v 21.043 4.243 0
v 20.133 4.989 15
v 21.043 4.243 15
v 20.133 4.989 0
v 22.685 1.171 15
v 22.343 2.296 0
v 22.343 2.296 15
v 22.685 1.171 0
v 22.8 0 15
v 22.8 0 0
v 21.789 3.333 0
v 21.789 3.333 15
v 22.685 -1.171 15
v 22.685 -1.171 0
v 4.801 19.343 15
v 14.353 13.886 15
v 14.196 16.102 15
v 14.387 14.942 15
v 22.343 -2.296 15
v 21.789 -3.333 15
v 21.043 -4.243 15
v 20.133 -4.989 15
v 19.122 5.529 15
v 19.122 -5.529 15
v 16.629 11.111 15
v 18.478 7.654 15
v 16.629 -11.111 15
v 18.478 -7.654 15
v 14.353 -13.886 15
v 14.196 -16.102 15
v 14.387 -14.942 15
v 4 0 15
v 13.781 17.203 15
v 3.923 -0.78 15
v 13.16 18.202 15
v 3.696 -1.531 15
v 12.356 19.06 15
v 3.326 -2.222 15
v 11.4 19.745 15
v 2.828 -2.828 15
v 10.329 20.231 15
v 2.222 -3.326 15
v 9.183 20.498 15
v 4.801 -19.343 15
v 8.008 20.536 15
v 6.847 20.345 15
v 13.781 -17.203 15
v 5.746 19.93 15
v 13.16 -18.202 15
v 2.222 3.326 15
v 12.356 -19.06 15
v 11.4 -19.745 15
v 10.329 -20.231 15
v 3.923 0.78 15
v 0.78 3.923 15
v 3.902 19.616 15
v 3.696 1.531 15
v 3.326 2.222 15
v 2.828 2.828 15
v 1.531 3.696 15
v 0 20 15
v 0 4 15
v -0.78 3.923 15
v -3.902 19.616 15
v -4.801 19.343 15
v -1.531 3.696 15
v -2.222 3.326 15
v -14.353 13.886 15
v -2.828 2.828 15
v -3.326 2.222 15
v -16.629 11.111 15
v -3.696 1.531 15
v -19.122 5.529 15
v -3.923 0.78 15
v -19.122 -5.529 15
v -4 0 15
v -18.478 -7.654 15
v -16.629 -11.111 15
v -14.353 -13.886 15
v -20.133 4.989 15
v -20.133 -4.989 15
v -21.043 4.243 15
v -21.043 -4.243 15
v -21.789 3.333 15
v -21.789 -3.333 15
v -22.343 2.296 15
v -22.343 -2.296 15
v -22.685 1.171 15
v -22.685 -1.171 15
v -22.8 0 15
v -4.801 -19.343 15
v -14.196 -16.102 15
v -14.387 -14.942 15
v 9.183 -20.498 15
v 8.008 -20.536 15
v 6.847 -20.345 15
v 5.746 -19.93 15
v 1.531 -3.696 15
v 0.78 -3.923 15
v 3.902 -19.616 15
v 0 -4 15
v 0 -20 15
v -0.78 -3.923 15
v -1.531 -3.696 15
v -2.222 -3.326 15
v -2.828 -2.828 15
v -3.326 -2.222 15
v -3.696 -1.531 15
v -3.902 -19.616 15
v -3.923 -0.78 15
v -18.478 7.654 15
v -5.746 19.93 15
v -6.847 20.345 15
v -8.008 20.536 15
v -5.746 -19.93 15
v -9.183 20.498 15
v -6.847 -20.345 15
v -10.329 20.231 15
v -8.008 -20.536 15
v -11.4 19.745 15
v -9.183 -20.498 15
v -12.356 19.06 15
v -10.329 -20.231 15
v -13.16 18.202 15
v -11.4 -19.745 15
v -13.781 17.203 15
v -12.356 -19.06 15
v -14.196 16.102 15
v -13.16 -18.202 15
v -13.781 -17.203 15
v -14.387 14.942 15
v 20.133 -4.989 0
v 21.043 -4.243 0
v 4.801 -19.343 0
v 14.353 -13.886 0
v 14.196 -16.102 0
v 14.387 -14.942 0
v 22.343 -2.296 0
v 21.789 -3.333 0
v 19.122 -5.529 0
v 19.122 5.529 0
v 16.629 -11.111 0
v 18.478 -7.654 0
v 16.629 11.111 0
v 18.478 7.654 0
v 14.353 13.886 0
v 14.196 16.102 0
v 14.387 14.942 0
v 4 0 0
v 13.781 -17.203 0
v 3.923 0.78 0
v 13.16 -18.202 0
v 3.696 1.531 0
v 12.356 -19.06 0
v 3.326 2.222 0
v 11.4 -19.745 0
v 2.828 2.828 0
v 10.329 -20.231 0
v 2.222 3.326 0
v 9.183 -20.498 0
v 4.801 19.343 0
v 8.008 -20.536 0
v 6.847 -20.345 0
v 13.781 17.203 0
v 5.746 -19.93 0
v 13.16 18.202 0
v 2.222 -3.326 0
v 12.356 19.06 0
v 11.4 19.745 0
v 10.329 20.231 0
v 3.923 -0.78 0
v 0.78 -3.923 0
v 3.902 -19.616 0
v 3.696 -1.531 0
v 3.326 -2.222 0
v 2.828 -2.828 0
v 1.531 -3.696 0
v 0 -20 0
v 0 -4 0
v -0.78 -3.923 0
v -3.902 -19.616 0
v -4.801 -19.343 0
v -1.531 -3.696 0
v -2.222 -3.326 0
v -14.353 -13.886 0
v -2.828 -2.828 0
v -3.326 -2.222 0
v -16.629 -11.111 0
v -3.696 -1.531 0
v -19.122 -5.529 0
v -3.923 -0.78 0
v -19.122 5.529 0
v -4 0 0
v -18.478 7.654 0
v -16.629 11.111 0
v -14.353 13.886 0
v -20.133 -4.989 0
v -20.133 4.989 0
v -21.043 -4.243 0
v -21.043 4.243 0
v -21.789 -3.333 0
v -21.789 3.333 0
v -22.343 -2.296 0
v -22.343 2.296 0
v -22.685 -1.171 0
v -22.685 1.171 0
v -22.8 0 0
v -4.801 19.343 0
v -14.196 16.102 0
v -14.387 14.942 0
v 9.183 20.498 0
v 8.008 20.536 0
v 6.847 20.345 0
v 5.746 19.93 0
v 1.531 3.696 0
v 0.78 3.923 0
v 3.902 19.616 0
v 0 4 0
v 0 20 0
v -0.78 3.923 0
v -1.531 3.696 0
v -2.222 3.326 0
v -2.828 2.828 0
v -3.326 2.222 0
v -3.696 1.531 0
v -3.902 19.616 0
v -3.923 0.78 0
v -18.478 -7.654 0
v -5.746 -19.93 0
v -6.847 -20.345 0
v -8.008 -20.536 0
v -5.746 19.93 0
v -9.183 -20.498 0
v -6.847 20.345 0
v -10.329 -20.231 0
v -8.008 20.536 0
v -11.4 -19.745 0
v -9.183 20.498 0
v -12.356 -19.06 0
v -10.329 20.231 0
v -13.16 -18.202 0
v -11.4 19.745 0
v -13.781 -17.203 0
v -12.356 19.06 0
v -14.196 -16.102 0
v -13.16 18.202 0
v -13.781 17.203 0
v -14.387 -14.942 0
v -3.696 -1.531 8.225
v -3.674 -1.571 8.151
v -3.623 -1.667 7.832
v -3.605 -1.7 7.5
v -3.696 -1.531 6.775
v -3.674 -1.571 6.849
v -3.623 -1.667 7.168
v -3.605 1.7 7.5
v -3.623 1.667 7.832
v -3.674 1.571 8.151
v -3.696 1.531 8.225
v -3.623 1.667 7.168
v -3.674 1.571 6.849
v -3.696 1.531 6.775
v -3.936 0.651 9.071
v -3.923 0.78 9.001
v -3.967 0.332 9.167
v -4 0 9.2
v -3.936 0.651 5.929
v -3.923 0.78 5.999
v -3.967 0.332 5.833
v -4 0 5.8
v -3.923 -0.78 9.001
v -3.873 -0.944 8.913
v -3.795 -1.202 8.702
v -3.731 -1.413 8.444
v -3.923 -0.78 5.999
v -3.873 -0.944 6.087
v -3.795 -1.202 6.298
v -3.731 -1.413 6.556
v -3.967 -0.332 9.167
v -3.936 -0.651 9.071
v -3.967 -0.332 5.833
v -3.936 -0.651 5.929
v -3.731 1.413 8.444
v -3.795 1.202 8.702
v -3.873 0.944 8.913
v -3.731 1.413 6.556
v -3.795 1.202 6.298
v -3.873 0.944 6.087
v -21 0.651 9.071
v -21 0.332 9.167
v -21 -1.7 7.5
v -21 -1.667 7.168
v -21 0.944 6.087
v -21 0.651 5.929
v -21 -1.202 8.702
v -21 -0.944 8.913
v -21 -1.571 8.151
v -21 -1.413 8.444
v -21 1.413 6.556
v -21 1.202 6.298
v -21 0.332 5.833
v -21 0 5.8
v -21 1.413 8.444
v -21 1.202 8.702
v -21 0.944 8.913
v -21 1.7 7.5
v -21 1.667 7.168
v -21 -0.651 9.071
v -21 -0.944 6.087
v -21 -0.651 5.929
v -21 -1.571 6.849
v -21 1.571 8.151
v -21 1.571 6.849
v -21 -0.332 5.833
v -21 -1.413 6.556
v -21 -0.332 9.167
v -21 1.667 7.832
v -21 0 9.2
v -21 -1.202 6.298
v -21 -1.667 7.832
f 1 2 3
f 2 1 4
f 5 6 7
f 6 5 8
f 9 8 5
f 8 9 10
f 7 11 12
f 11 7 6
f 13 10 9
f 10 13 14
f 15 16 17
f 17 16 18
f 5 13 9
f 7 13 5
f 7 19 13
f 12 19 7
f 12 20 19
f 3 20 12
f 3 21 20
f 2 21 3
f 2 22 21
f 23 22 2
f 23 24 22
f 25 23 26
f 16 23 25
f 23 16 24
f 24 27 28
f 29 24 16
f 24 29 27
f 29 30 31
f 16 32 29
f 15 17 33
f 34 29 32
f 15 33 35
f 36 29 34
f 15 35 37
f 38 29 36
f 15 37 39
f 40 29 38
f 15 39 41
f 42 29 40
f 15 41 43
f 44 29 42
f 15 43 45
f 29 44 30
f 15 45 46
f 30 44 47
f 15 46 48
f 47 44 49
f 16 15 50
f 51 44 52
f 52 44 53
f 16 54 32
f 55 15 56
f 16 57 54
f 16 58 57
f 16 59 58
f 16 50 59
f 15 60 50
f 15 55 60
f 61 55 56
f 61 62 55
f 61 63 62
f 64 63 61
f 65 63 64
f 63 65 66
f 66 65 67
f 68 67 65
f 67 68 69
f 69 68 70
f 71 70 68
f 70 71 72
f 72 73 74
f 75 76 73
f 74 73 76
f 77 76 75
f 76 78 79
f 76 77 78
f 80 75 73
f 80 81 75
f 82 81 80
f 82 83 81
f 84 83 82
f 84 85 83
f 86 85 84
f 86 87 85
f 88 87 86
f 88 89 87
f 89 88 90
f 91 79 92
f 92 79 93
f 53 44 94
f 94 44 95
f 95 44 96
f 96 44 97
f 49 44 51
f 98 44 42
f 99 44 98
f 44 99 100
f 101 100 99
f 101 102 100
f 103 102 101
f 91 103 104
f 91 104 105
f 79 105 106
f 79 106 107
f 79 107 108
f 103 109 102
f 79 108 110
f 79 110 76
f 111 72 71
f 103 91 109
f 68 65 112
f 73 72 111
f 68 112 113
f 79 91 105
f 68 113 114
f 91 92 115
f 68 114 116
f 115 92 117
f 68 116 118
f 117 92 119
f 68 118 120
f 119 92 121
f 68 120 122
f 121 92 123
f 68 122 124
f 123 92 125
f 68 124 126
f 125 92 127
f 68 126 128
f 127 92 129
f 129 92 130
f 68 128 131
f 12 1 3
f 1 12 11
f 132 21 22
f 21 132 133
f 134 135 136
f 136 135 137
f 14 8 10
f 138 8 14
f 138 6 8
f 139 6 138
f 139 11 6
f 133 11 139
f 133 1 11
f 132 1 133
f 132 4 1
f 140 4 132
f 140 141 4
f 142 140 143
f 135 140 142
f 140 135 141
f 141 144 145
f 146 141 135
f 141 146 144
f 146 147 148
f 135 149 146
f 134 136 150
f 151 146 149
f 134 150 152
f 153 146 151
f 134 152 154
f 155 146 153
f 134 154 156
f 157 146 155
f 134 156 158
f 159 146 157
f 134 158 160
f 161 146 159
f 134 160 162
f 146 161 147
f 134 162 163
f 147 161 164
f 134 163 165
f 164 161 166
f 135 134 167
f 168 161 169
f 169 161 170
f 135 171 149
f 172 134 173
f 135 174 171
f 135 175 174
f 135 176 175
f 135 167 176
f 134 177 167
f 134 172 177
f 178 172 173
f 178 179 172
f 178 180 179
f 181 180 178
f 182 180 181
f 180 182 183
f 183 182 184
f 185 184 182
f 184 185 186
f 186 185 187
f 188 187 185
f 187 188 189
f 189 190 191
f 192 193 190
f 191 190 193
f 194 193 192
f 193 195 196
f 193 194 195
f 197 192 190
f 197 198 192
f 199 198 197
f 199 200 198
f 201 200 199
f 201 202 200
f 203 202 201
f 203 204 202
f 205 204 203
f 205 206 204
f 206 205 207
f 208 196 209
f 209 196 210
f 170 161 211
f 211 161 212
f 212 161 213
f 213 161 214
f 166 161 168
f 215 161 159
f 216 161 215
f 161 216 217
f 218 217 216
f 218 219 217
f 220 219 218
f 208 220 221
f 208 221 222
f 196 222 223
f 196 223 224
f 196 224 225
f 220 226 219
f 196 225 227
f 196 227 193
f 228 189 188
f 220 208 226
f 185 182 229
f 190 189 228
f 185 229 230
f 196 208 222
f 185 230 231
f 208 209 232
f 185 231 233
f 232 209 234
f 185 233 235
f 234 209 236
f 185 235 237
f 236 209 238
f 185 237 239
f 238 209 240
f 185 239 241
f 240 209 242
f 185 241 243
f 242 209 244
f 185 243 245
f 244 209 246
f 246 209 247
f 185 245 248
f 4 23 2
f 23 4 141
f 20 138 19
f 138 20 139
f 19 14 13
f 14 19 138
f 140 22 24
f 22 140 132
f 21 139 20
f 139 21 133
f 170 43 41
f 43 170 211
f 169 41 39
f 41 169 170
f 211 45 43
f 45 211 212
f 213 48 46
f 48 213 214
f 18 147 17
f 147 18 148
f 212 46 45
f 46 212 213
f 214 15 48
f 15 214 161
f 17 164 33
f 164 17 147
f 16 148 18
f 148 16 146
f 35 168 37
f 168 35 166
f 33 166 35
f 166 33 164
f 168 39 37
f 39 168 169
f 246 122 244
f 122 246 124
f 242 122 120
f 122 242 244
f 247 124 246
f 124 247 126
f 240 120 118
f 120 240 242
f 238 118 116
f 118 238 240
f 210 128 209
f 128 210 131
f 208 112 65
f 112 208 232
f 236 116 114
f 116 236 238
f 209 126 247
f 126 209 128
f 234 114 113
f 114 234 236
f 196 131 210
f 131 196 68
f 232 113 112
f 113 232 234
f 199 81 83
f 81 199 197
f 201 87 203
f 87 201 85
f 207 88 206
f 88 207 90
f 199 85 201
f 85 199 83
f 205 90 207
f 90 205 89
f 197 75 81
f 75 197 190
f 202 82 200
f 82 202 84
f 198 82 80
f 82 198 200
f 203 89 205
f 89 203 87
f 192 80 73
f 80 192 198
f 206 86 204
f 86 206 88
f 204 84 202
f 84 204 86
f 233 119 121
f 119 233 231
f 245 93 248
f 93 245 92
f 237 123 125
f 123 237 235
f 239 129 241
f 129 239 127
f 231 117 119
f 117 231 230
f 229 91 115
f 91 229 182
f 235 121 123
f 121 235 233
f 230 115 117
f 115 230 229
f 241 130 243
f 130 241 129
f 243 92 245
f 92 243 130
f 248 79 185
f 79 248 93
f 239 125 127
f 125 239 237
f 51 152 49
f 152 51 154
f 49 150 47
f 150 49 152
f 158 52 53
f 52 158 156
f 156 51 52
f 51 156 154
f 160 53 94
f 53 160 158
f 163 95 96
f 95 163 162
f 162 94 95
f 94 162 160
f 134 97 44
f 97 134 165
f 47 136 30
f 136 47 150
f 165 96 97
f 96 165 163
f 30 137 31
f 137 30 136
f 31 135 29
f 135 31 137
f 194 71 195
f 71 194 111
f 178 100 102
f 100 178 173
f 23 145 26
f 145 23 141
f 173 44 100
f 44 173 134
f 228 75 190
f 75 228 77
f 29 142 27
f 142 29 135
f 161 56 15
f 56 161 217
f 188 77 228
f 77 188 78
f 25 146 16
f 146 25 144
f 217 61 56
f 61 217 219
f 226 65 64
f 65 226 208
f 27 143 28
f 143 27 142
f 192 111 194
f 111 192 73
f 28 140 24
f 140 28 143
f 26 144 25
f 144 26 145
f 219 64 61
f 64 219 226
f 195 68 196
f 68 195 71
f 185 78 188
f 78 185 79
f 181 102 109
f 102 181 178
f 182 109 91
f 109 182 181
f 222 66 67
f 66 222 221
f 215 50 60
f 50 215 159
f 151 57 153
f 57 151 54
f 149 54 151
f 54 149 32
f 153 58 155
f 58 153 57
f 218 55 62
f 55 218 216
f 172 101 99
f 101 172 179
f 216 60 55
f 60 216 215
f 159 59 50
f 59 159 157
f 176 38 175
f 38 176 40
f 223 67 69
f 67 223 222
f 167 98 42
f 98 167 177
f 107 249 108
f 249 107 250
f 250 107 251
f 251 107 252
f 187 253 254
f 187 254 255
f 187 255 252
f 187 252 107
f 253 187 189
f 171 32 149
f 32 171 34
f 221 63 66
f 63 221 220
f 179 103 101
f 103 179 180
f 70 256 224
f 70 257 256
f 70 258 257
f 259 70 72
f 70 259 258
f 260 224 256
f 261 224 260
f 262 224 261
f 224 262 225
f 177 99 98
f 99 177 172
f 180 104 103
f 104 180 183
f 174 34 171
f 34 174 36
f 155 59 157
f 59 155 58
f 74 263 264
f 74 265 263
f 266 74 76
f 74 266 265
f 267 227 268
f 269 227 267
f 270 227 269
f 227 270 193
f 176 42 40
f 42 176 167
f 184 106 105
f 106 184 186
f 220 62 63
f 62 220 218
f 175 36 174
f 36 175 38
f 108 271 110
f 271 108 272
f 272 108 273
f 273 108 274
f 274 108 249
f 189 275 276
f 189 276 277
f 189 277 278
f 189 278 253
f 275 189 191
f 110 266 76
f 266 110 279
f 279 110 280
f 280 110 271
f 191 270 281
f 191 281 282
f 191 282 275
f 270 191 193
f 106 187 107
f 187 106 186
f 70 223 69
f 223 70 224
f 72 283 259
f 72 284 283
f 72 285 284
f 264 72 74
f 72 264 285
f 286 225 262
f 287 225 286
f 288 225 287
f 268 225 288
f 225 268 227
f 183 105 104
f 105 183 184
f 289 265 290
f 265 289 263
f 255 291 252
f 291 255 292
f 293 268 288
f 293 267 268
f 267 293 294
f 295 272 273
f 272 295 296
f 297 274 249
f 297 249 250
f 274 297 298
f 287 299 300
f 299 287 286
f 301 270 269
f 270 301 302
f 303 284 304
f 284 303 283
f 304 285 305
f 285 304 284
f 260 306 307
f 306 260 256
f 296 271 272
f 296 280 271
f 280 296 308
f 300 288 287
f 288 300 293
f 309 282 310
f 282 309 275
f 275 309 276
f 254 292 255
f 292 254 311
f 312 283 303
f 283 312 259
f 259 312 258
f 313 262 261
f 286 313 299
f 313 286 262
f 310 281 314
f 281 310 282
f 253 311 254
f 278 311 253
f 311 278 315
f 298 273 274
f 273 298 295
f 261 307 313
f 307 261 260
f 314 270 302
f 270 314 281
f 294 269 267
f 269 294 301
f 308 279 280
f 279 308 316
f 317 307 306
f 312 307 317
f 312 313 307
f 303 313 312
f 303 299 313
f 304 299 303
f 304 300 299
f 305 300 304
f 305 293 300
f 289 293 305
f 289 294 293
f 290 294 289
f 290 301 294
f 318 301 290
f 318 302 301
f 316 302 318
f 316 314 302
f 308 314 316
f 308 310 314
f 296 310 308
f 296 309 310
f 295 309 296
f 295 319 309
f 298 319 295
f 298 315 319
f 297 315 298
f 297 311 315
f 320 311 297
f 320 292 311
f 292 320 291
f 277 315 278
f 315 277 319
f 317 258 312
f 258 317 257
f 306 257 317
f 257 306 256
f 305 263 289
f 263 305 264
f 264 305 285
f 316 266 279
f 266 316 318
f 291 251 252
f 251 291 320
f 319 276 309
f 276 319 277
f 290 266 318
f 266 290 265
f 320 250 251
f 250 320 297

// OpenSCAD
$fn = 32;

// ----------------------------------------------------------------------
// Hand knob: 40 x 40 x 15 mm
// ----------------------------------------------------------------------

// --- parameters (mm) ---
head_d = 40;              // knob diameter
head_h = 15;              // knob height
hole_d = 8;               // shaft bore
set_d = 3.4;              // set screw tap hole
notch_d = 1.62;           // knurl groove diameter
lobes = 6;                // grip lobes

module body() {
  cylinder(h = head_h, d = head_d);
  for (i = [0 : lobes - 1])
    rotate([0, 0, i * 360 / lobes])
      translate([head_d * 0.42, 0, 0])
        cylinder(h = head_h, d = head_d * 0.3);
}

difference() {
  union() {
    body();
  }
  translate([0, 0, -1]) cylinder(h = head_h + 0 + 2, d = hole_d);
  translate([-head_d / 2 - 1, 0, head_h * 0.5]) rotate([0, 90, 0]) cylinder(h = head_d / 2 + 2, d = set_d);
}
